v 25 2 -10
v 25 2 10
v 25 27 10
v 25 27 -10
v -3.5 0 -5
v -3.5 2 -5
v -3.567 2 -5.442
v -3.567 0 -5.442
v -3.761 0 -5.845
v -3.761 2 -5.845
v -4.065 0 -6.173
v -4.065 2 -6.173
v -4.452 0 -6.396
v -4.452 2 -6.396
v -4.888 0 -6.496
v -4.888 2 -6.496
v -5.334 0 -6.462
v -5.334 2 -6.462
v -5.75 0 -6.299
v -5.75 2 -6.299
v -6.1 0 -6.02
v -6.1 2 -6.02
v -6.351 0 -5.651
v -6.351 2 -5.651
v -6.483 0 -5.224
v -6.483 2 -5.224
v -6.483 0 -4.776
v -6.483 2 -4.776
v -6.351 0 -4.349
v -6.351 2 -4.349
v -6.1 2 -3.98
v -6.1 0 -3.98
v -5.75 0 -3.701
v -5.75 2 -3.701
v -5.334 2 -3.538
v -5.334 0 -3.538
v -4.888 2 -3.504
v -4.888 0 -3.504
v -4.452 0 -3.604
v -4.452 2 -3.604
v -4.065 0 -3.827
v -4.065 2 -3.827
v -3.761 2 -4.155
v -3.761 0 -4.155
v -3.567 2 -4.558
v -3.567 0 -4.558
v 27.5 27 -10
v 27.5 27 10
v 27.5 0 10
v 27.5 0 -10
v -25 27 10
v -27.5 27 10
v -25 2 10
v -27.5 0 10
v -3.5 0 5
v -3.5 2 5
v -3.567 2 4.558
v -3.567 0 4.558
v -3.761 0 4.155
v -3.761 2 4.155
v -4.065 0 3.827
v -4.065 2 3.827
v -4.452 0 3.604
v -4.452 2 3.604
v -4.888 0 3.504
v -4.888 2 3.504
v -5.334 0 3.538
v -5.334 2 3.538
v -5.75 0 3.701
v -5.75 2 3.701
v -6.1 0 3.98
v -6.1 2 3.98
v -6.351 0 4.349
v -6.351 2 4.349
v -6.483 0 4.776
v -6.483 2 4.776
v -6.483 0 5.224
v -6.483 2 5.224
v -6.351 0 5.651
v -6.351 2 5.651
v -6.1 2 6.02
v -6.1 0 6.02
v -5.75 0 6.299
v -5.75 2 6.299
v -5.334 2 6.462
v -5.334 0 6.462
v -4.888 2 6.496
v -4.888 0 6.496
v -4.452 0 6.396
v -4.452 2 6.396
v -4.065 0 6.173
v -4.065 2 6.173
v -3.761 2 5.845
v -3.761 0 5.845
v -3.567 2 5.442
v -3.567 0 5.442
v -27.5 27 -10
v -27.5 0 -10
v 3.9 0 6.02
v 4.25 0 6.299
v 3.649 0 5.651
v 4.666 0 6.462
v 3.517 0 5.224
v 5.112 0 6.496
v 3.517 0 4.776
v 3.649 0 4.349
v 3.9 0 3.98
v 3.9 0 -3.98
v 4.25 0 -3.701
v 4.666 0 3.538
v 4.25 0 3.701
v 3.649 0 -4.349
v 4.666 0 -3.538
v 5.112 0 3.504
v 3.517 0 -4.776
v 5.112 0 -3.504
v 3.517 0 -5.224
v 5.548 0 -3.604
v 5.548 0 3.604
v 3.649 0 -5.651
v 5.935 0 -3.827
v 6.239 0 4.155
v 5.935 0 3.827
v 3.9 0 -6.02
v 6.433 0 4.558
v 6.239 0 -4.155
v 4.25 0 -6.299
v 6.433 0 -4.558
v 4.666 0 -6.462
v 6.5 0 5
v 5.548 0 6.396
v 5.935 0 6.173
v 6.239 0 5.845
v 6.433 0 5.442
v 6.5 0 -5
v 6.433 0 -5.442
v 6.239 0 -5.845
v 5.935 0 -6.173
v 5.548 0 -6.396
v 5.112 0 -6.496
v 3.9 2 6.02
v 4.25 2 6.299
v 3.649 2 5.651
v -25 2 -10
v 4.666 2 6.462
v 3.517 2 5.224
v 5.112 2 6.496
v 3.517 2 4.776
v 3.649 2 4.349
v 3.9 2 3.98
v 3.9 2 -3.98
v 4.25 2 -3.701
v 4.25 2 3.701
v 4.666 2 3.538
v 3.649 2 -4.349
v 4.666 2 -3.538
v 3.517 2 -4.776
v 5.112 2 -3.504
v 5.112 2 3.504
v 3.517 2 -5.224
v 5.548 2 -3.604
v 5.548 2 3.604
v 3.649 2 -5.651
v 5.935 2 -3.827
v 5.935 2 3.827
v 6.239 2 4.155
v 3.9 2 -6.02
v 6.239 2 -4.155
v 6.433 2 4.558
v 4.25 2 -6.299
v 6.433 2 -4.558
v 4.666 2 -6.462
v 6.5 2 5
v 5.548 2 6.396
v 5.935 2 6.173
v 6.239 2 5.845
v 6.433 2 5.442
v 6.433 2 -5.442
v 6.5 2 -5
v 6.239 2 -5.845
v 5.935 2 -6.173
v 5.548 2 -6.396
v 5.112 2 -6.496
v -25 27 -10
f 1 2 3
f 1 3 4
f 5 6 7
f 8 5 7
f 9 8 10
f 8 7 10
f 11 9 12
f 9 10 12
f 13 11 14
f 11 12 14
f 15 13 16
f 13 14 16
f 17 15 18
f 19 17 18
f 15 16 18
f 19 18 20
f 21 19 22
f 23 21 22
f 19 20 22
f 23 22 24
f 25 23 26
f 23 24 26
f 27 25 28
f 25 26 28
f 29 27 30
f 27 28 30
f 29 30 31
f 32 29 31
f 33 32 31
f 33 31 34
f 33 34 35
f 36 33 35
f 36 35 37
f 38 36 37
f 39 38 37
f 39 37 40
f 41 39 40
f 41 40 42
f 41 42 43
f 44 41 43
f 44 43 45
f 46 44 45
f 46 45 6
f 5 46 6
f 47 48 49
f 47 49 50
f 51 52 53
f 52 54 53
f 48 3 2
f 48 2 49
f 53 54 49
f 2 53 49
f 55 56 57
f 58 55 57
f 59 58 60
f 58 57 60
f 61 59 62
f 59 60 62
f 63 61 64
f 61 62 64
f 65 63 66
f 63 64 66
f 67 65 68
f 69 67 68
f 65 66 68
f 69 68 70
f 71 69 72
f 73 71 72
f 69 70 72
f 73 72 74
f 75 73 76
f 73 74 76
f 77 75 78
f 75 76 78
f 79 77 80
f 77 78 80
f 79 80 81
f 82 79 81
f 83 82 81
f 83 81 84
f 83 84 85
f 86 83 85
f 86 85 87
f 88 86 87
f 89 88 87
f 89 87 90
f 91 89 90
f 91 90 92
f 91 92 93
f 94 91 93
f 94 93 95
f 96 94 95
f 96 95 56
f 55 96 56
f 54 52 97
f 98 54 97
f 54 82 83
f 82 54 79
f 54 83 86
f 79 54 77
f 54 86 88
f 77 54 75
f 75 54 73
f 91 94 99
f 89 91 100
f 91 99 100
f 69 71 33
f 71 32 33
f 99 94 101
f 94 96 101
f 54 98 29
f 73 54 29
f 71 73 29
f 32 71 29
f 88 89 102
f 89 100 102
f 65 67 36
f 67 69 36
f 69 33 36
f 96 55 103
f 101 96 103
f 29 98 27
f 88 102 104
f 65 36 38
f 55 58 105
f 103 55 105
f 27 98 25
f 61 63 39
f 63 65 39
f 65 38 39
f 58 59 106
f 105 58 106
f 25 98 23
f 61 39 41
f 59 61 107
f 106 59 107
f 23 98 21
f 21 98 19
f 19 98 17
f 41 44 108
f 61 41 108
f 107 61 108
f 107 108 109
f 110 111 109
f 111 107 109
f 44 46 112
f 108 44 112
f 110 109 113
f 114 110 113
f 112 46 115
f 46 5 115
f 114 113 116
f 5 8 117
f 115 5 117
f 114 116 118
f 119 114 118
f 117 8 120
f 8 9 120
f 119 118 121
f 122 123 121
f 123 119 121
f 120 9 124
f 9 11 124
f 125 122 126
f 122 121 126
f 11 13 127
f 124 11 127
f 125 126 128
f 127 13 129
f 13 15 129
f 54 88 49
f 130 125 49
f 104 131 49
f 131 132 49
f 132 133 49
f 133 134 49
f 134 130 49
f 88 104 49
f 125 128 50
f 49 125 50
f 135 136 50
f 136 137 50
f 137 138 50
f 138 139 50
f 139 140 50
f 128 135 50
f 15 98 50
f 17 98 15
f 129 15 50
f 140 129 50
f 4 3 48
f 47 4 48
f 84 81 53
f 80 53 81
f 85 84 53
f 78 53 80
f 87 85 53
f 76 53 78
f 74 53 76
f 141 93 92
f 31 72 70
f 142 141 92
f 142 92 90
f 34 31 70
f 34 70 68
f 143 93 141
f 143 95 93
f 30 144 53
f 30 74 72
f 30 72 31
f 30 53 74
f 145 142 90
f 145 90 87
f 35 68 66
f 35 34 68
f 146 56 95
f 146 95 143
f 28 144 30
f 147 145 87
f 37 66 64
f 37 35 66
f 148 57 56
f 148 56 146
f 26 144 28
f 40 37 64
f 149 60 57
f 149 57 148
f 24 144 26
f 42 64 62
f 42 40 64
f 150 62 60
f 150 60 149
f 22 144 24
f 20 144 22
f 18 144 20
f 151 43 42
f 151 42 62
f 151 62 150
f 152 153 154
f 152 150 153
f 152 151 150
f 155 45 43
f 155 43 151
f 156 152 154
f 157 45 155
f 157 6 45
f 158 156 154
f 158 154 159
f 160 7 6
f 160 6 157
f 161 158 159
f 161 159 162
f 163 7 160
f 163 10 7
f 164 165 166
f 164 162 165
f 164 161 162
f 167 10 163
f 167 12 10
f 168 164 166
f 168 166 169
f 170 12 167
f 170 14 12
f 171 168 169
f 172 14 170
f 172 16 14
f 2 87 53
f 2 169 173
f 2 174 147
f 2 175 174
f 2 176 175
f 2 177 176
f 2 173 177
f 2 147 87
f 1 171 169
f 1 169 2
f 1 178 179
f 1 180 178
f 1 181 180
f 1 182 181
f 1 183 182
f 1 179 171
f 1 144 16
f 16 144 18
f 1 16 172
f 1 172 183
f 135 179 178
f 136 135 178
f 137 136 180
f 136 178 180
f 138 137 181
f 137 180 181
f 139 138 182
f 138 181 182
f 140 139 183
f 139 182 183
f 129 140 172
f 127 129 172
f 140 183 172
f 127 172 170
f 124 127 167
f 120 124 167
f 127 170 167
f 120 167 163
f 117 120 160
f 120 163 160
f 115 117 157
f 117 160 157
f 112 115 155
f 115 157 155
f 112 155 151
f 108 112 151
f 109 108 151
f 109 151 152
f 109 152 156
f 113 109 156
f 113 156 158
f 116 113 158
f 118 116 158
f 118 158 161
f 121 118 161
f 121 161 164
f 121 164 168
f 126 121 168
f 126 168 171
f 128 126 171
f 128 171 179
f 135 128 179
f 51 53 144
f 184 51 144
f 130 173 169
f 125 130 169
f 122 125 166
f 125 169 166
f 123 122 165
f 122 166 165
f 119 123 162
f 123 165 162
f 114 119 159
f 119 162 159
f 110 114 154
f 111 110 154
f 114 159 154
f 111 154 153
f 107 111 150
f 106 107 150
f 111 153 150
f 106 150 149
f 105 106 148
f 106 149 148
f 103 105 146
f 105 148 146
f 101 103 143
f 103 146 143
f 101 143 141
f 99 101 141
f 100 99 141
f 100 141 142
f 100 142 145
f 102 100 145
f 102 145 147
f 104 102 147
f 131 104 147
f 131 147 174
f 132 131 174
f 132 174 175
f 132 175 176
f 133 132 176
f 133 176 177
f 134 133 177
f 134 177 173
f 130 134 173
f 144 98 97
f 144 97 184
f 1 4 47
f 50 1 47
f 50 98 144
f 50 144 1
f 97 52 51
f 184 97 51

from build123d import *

# Parameters (mm, degrees)
SKETCH1_W           = 55
SKETCH1_H           = 20
BOSS_EXTRUDE1_DEPTH = 2
SKETCH2_W           = 2.5
SKETCH2_H           = 20
BOSS_EXTRUDE2_DEPTH = 25
SKETCH3_R           = 1.5
CUT_EXTRUDE1_DEPTH  = 3


with BuildPart() as part:
    # Sketch1 → Boss-Extrude1 (new body)
    with BuildSketch(Plane(origin=(0, 0, 0), x_dir=(1, 0, 0), z_dir=(0, 1, 0))):
        Rectangle(SKETCH1_W, SKETCH1_H)
    extrude(amount=BOSS_EXTRUDE1_DEPTH)

    # Sketch2 → Boss-Extrude2 (add)
    with BuildSketch(Plane(origin=(0, 2, 0), x_dir=(1, 0, 0), z_dir=(0, 1, 0))):
        with Locations((-26.25, 0)):
            Rectangle(SKETCH2_W, SKETCH2_H)
        with Locations((26.25, 0)):
            Rectangle(SKETCH2_W, SKETCH2_H)
    extrude(amount=BOSS_EXTRUDE2_DEPTH)

    # Sketch3 → Cut-Extrude1 (cut, through all)
    with BuildSketch(Plane(origin=(0, 2, 0), x_dir=(1, 0, 0), z_dir=(0, 1, 0))):
        with Locations((5, 5)):
            Circle(SKETCH3_R)
        with Locations((-5, 5)):
            Circle(SKETCH3_R)
        with Locations((-5, -5)):
            Circle(SKETCH3_R)
        with Locations((5, -5)):
            Circle(SKETCH3_R)
    extrude(amount=-CUT_EXTRUDE1_DEPTH, mode=Mode.SUBTRACT)


solid = part.part
